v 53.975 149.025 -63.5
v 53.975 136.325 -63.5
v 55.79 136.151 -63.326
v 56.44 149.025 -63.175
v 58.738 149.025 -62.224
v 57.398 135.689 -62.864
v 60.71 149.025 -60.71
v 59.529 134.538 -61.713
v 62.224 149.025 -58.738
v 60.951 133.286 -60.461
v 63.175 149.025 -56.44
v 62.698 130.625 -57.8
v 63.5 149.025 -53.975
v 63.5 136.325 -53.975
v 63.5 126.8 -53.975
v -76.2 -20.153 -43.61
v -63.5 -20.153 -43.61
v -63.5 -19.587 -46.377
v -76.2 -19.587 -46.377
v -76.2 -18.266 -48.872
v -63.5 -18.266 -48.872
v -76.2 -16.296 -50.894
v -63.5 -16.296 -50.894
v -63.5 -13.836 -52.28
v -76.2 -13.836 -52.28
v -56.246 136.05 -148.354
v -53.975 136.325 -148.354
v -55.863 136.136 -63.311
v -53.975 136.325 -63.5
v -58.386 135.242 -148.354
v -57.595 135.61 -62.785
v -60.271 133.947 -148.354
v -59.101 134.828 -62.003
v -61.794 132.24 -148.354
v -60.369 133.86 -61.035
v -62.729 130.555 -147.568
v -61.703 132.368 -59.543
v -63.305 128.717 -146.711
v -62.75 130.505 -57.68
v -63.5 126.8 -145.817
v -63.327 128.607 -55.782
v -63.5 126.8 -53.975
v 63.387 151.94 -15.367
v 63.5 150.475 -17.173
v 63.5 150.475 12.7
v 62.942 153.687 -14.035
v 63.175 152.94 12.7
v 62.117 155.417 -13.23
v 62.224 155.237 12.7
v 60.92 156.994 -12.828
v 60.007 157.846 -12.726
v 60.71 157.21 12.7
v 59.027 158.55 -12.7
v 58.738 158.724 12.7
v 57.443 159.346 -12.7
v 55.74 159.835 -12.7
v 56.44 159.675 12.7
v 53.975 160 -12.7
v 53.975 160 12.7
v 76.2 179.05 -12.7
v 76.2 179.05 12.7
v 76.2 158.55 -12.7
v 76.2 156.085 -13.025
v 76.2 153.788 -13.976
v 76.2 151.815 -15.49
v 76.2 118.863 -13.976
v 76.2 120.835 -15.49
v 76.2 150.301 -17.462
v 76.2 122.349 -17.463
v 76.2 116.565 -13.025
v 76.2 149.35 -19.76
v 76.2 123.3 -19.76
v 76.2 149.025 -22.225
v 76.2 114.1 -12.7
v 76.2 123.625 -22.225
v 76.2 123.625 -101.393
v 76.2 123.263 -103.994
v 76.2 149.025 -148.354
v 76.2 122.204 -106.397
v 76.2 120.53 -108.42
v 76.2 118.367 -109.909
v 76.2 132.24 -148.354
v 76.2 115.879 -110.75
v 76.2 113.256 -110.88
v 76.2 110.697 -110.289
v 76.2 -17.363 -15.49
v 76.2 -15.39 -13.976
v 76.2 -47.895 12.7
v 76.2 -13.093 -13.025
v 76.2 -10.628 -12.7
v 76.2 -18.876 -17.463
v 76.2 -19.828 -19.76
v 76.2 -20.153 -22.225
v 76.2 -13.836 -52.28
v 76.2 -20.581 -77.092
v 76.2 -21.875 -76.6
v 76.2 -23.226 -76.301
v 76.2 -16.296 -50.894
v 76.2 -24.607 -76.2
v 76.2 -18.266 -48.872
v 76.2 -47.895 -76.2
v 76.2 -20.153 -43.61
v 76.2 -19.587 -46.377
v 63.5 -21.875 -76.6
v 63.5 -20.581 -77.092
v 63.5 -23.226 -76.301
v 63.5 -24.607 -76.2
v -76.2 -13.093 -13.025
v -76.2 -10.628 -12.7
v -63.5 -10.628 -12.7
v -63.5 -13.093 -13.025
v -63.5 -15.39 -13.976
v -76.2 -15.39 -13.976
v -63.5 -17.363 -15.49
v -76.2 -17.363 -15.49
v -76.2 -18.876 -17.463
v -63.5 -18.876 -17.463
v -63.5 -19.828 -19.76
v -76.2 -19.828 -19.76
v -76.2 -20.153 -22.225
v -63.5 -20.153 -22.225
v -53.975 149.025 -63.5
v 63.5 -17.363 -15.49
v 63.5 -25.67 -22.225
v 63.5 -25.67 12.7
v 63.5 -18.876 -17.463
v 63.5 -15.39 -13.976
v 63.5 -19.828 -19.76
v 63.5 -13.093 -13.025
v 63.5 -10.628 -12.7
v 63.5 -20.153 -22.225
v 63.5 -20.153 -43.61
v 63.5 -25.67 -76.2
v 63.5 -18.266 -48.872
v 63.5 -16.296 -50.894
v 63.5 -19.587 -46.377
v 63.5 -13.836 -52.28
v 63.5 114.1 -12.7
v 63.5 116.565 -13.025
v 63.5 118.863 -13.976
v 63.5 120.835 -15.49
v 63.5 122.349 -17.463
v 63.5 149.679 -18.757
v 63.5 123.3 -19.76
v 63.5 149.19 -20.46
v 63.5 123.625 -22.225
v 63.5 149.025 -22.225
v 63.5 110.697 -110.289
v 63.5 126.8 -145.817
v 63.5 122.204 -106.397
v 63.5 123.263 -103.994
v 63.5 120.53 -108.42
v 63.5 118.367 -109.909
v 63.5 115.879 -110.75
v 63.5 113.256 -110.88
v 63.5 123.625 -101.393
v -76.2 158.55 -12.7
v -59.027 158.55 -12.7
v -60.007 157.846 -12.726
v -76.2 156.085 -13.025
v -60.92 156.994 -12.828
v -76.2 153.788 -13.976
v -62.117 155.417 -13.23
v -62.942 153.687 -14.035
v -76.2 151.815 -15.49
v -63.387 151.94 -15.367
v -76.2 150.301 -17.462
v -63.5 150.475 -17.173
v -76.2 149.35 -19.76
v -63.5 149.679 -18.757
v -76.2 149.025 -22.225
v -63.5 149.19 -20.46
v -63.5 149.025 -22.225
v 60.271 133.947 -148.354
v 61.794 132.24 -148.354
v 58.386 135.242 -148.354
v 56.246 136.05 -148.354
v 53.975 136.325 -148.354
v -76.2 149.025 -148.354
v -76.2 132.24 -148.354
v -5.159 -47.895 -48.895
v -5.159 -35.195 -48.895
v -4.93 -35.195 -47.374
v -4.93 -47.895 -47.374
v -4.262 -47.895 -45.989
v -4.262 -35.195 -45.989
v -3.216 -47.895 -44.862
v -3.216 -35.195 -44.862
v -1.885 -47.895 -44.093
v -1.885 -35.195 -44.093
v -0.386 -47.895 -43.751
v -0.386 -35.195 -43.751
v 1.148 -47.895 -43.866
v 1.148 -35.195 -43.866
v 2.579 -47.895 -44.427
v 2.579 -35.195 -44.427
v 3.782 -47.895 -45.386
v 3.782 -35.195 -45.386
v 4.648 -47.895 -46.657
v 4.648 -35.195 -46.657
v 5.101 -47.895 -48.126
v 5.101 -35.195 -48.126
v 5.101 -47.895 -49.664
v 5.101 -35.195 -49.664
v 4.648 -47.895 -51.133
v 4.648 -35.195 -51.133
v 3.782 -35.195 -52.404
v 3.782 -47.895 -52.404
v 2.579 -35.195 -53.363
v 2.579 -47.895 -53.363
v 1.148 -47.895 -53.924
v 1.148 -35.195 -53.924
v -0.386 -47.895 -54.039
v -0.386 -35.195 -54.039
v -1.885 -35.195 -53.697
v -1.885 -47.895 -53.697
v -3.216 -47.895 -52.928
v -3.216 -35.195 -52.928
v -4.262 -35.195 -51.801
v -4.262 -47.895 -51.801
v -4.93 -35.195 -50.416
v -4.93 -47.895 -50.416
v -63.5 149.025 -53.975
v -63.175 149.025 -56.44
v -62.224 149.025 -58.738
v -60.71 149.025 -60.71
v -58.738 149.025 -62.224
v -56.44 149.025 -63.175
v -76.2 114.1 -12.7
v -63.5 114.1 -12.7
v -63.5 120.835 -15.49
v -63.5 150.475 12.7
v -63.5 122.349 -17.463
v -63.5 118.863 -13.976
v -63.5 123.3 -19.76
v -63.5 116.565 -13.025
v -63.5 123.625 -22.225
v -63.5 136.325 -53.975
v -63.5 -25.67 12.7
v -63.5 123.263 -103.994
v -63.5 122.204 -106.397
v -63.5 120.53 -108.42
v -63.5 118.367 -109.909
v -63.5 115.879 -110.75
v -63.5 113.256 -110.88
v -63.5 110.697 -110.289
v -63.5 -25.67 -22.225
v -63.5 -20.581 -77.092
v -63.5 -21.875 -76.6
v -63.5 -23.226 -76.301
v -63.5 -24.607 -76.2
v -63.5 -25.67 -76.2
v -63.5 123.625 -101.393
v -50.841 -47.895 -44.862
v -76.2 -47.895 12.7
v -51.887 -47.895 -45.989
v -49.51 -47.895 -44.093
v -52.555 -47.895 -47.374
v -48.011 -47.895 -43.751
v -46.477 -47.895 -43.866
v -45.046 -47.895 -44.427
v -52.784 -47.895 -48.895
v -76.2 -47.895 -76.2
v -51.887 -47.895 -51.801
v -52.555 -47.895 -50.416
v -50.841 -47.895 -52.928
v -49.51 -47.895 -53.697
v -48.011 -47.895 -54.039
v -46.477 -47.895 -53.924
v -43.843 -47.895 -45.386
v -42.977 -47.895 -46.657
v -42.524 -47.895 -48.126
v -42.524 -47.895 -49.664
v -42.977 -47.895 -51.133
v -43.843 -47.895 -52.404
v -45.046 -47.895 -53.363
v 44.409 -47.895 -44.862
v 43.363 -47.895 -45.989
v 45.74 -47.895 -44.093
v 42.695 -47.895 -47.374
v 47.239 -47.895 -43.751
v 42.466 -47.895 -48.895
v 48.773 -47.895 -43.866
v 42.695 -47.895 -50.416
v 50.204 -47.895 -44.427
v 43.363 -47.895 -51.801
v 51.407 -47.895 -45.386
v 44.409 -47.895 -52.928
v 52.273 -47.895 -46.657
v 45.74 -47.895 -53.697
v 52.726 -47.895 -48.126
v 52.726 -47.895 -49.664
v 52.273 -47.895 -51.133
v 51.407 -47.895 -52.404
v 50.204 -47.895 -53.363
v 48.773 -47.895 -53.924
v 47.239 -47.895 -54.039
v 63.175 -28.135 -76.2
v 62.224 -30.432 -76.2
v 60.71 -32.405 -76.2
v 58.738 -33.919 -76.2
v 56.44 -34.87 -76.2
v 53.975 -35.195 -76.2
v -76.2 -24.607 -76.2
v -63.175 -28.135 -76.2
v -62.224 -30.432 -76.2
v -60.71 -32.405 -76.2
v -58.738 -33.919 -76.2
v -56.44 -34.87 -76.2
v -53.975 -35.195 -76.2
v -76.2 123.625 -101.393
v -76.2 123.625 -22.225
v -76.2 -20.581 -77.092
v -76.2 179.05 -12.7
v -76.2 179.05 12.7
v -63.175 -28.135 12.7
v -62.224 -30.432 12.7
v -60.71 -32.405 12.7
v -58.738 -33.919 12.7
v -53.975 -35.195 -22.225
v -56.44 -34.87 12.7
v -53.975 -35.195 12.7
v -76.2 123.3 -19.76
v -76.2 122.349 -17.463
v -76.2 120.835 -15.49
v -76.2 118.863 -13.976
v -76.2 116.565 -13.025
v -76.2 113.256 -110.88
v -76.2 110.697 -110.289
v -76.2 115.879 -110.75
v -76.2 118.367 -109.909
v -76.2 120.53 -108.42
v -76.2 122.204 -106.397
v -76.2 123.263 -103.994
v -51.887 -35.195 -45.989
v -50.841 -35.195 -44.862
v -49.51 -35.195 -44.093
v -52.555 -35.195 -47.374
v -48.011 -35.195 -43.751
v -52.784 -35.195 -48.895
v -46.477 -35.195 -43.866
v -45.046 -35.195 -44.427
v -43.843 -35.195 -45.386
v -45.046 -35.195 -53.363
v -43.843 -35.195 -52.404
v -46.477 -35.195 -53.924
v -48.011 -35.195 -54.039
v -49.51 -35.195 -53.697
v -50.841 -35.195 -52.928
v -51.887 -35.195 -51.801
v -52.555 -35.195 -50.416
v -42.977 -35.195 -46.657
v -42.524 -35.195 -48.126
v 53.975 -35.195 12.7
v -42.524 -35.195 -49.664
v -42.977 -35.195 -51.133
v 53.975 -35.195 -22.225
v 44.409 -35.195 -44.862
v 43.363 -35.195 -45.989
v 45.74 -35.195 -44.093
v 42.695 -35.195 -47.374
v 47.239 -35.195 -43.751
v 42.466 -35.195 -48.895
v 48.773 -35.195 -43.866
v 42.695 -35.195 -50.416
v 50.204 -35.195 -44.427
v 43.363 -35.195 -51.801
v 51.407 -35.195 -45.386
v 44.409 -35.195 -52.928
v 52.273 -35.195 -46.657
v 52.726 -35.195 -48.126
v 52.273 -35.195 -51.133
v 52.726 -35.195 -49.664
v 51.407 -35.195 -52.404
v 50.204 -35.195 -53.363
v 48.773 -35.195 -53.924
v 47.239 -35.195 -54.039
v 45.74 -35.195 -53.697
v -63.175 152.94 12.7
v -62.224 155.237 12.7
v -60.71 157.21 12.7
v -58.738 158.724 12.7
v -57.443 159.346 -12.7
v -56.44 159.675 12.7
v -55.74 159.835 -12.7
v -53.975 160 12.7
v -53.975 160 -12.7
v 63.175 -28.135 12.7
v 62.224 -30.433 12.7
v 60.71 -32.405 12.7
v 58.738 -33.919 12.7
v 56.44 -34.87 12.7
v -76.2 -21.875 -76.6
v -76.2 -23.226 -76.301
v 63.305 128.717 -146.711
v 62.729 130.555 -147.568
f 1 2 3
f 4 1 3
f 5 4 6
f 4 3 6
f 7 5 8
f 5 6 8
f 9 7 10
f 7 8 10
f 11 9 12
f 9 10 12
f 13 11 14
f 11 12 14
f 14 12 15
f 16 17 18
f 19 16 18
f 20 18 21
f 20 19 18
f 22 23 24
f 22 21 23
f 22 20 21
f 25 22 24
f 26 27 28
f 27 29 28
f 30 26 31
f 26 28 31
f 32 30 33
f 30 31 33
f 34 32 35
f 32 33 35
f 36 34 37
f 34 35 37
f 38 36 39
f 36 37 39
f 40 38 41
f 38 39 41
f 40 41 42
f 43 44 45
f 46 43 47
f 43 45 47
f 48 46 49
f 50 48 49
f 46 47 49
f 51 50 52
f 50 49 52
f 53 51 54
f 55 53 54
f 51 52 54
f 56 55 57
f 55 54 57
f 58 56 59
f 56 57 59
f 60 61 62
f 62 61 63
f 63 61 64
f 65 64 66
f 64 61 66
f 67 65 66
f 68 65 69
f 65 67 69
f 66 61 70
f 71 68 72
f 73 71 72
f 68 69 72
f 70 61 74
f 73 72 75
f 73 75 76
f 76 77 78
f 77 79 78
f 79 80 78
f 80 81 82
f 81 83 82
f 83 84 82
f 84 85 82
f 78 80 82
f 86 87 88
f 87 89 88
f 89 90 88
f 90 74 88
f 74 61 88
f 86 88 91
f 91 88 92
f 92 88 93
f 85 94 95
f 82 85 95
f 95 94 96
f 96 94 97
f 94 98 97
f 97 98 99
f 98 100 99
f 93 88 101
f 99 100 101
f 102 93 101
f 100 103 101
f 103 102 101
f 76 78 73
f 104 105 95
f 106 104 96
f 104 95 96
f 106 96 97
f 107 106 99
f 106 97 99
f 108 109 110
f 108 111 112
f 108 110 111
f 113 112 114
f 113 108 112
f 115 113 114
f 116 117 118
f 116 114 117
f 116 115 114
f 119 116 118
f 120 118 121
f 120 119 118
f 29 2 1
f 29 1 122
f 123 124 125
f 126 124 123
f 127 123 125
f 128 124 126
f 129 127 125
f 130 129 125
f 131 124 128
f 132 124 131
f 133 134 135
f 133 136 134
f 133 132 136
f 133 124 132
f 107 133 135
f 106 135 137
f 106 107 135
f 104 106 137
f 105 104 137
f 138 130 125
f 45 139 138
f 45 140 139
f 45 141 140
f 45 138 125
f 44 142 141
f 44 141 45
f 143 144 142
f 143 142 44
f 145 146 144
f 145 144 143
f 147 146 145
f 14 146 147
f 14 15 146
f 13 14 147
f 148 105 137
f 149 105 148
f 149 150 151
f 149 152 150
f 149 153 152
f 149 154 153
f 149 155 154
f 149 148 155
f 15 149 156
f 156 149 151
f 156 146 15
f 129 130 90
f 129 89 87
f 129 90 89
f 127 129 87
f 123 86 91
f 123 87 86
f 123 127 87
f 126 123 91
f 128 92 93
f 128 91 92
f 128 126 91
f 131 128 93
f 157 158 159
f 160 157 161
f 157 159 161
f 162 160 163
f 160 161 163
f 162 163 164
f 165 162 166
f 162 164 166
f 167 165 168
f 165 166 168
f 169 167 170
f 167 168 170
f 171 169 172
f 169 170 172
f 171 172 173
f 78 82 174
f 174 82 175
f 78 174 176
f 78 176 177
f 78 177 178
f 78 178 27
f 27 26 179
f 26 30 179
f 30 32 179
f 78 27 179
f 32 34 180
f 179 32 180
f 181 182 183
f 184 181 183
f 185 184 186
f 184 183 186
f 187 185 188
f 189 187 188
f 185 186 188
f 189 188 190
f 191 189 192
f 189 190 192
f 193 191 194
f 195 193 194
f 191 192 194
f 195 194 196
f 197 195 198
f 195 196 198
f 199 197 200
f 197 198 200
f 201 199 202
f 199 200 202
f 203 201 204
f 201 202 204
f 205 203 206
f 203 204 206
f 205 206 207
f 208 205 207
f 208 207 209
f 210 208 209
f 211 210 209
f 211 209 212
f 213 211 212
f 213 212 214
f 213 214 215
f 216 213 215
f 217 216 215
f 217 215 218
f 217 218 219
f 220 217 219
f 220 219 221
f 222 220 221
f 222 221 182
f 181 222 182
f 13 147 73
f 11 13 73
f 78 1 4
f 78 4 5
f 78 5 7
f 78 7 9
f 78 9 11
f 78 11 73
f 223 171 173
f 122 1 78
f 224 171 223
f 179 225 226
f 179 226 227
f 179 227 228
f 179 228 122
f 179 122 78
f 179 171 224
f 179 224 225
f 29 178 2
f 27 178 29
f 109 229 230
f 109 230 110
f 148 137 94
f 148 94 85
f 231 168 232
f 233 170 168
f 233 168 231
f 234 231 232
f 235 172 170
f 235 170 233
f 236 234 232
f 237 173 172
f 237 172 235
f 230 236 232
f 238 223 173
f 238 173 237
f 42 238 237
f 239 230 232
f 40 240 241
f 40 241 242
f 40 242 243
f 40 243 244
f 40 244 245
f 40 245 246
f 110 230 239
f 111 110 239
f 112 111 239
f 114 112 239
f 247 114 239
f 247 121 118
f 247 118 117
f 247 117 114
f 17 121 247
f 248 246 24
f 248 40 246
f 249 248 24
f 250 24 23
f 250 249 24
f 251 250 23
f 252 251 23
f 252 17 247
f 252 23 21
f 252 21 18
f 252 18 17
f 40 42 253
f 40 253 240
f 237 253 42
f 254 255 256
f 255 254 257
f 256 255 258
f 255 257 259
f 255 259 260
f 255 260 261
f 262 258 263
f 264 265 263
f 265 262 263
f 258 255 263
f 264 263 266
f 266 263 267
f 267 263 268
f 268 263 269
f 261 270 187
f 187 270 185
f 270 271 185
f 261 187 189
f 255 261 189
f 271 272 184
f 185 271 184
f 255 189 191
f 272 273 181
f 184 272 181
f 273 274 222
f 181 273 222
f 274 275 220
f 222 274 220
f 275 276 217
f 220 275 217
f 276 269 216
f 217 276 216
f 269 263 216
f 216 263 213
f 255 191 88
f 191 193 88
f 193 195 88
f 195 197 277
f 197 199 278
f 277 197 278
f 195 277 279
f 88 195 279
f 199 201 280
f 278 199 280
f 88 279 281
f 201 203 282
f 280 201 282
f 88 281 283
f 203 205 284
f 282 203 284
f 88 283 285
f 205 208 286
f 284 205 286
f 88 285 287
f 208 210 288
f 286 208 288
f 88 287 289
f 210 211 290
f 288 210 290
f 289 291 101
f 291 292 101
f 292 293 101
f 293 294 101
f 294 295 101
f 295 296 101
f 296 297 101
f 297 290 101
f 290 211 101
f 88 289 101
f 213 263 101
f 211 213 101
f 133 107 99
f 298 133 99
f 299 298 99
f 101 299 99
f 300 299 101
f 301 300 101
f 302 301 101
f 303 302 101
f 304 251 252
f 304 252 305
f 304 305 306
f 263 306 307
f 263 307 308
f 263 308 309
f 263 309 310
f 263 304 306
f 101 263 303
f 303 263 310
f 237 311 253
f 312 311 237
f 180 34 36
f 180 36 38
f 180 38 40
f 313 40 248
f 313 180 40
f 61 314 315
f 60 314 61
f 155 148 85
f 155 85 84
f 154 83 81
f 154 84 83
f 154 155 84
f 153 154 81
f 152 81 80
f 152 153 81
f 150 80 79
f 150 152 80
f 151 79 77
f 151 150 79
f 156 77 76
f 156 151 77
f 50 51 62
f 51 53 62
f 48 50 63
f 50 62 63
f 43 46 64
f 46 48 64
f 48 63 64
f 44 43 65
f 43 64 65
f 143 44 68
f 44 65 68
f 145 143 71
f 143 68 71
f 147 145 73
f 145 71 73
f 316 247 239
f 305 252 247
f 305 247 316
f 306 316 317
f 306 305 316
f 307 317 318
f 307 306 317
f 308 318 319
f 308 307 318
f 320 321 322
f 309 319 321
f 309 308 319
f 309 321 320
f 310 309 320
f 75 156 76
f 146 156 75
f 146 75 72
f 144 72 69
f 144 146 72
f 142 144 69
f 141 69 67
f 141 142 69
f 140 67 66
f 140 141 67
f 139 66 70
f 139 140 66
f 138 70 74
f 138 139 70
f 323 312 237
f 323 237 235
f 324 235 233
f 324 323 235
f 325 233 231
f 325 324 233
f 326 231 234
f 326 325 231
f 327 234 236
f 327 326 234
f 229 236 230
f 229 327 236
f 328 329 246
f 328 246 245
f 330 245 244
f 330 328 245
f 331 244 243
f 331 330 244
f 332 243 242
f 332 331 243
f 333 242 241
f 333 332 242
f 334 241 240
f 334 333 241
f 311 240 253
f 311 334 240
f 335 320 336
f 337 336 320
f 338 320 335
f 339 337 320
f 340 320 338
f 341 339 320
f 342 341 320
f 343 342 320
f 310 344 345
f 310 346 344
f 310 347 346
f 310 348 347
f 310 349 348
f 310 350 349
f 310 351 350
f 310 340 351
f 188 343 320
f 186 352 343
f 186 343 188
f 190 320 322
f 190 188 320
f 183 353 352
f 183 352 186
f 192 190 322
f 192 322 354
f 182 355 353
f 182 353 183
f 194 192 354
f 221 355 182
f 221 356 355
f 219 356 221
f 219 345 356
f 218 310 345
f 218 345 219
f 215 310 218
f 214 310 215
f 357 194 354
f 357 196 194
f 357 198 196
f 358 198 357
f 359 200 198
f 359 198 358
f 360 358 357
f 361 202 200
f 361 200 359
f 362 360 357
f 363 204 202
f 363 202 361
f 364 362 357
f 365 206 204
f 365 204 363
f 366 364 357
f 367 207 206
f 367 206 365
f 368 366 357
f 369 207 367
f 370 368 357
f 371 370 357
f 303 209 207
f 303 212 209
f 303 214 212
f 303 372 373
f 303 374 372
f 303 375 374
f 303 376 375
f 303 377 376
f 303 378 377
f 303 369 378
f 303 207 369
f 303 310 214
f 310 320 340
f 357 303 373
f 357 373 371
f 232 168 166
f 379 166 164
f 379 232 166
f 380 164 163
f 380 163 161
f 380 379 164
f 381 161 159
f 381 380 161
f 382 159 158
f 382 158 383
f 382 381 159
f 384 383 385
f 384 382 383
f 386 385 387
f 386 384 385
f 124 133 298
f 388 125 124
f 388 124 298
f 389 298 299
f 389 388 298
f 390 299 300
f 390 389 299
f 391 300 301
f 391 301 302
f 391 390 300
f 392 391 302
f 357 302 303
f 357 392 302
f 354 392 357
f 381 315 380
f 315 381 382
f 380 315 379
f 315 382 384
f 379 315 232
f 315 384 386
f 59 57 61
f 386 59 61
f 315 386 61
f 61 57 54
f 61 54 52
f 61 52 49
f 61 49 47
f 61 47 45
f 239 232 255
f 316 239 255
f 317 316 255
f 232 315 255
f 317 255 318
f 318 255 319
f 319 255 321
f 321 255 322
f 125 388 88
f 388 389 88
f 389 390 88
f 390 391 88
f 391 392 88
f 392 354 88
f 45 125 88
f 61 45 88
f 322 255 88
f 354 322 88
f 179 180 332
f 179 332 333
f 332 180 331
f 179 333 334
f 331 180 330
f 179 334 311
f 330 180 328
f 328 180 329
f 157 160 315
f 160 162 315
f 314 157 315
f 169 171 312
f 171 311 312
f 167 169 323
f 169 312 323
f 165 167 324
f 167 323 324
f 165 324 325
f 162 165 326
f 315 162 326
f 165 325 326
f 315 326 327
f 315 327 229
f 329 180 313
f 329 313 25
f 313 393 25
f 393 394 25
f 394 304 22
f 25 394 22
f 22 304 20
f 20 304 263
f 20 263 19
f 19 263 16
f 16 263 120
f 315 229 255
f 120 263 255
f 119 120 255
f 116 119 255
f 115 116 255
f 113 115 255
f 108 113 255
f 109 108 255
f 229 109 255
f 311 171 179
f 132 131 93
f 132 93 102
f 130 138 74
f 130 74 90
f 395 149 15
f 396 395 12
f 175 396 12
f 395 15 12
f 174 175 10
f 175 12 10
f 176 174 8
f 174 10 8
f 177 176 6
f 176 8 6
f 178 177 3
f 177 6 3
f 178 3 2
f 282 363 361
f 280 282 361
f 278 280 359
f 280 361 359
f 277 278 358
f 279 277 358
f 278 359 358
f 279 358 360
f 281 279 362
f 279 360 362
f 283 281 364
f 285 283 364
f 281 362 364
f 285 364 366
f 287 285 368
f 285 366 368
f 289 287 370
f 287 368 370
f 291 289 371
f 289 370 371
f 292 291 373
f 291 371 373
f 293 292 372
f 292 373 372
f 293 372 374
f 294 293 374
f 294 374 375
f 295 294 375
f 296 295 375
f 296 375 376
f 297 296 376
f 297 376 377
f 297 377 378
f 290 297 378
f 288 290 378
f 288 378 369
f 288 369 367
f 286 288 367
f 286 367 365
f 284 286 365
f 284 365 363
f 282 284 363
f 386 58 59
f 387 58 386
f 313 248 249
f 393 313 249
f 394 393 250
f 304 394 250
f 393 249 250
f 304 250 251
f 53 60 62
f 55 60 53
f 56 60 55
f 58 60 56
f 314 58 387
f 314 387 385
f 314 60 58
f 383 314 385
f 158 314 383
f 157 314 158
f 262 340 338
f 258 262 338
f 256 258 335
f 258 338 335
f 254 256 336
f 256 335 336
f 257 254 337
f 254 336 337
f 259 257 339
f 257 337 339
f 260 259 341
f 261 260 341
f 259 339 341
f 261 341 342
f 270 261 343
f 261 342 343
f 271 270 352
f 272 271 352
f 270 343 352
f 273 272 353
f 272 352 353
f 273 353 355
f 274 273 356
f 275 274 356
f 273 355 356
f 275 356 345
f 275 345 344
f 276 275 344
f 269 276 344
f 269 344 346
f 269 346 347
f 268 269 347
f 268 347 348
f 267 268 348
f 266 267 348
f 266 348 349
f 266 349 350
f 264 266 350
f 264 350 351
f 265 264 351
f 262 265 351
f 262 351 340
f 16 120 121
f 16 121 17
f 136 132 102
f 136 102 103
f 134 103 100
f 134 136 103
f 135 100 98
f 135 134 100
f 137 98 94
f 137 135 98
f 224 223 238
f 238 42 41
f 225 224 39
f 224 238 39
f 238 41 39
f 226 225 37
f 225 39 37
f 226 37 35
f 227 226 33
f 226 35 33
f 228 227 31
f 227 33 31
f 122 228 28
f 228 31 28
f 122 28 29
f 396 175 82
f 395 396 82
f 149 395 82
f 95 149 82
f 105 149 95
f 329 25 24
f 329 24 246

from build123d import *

# Parameters (mm, degrees)
BOSS_EXTRUDE1_DEPTH             = 179.04999999999998
BOSS_EXTRUDE1_DEPTH_BACK        = 139.19200000000004
BOSS_EXTRUDE2_REACH             = 246.692
BOSS_EXTRUDE2_DIRECTION_2_REACH = 246.692
F_3_8_CLEARANCE_HOLE1_D         = 10.31748
CUT_EXTRUDE1_DEPTH              = 245.69215738419686
CUT_EXTRUDE1_DEPTH_BACK         = 245.69215738419686
FILLET1_R                       = 9.525
CUT_EXTRUDE2_DEPTH              = 101.6
CUT_EXTRUDE2_DEPTH_BACK         = 184.22
FILLET2_START                   = -36
FILLET2_DEPTH                   = 185.025000106
FILLET2_START_2                 = -63.5
FILLET2_2_DEPTH                 = 9.525
FILLET2_START_3                 = 53.975
FILLET2_3_DEPTH                 = 9.525
FILLET2_START_4                 = 149.025000106
FILLET2_4_DEPTH                 = 9.525
FILLET2_5_DEPTH                 = 185.025000106
CUT_EXTRUDE3_DEPTH              = 245.69215738419686
CUT_EXTRUDE3_DEPTH_BACK         = 245.69215738419686
FILLET3_R                       = 9.525
CUT_EXTRUDE4_REACH              = 254.594
CUT_EXTRUDE5_DEPTH              = 245.6921573841969
CUT_EXTRUDE5_DEPTH_BACK         = 25.4
FILLET5_R                       = 9.525
CUT_EXTRUDE6_DEPTH              = 245.6921574759669
CUT_EXTRUDE6_DEPTH_BACK         = 245.6921574759669


with BuildPart() as part:
    # Sketch1 → Boss-Extrude1 (new, two sides: drawn at the far end of the back side and taken through both)
    with BuildSketch(Plane(origin=(0, 0, 0), x_dir=(1, 0, 0), z_dir=(0, 1, 0)).offset(-BOSS_EXTRUDE1_DEPTH_BACK)):
        Polygon((-76.20000000000003, 148.35400023367268), (-76.2000000000001, -12.7), (76.2, -12.7), (76.19999999999997, 148.35400023367268), align=None)
    extrude(amount=BOSS_EXTRUDE1_DEPTH + BOSS_EXTRUDE1_DEPTH_BACK)

    # SurfaceCut1
    split(bisect_by=Plane(origin=(-4.831e-14, -47.89499999999913, 0), x_dir=(1, -6e-17, 0), z_dir=(6e-17, 1, -1.73e-15)), keep=Keep.TOP)

    # Boss-Extrude2: up to this face of the body (flat: up to its plane)
    boss_extrude2_end = Plane(part.part.faces().sort_by_distance((76.2, 65.5775, -67.827000117))[0])
    # Sketch3 → Boss-Extrude2 (add, up to the picked face)
    with BuildSketch(Plane(origin=(0, 0, 0), x_dir=(0, 0, -1), z_dir=(1, 0, 0)), mode=Mode.PRIVATE) as boss_extrude2_sk1:
        Polygon((1.2e-16, -38.36999999999911), (75, -38.36999999999911), (75, -47.89499999999911), (1.29e-15, -47.89499999999911), align=None)
    boss_extrude2_tool1 = split(extrude(boss_extrude2_sk1.sketch, amount=BOSS_EXTRUDE2_REACH, mode=Mode.PRIVATE), bisect_by=boss_extrude2_end, keep=Keep.BOTH, mode=Mode.PRIVATE)
    add(boss_extrude2_tool1.solids().sort_by(Axis((0, -43.1325, -37.5), (1, 0, 0)))[0])

    # Boss-Extrude2 direction 2: up to this face of the body (flat: up to its plane)
    boss_extrude2_direction_2_end = Plane(part.part.faces().sort_by_distance((-76.2, 65.5775, -67.827000117))[0])
    # Sketch3 → Boss-Extrude2 direction 2 (add, up to the picked face)
    with BuildSketch(Plane(origin=(0, 0, 0), x_dir=(0, 0, -1), z_dir=(1, 0, 0)), mode=Mode.PRIVATE) as boss_extrude2_direction_2_sk1:
        Polygon((1.2e-16, -38.36999999999911), (75, -38.36999999999911), (75, -47.89499999999911), (1.29e-15, -47.89499999999911), align=None)
    boss_extrude2_direction_2_tool1 = split(extrude(boss_extrude2_direction_2_sk1.sketch, amount=-BOSS_EXTRUDE2_DIRECTION_2_REACH, mode=Mode.PRIVATE), bisect_by=boss_extrude2_direction_2_end, keep=Keep.BOTH, mode=Mode.PRIVATE)
    add(boss_extrude2_direction_2_tool1.solids().sort_by(Axis((0, -43.1325, -37.5), (-1, 0, 0)))[0])

    # 3/8 Clearance Hole1 (through all)
    with Locations(Plane.XZ.offset(47.89499999999913)):
        with Locations((47.625, -48.895), (-47.625, -48.895), (0, -48.895)):
            Hole(F_3_8_CLEARANCE_HOLE1_D / 2)

    # Sketch8 → Cut-Extrude1 (cut, two sides: drawn at the far end of the back side and taken through both)
    with BuildSketch(Plane(origin=(0, 0, 0), x_dir=(0, 0, -1), z_dir=(1, 0, 0)).offset(-CUT_EXTRUDE1_DEPTH_BACK)):
        Polygon((266.69999999999993, 301.4250001060008), (12.699999999999932, 301.42500010600077), (12.699999999999935, 149.02500010600082), (266.69999999999993, 149.02500010600085), align=None)
    extrude(amount=CUT_EXTRUDE1_DEPTH + CUT_EXTRUDE1_DEPTH_BACK, mode=Mode.SUBTRACT)

    # Fillet1
    fillet1_edges = [part.edges().sort_by_distance(p)[0] for p in [
        (-2.842e-14, 149.02500010600082, -12.699999999999935),
    ]]
    fillet(fillet1_edges, radius=FILLET1_R)

    # Sketch10 → Cut-Extrude2 (cut, two sides: drawn at the far end of the back side and taken through both)
    with BuildSketch(Plane(origin=(0, 149.02500010600082, 1.628e-14), x_dir=(1, 0, 0), z_dir=(0, 1, 1.1e-16)).offset(-CUT_EXTRUDE2_DEPTH_BACK)):
        Polygon((63.500000000000014, 63.49999999999994), (-63.500000000000014, 63.49999999999993), (-63.5, 12.699999999999932), (63.5, 12.699999999999948), align=None)
    extrude(amount=CUT_EXTRUDE2_DEPTH + CUT_EXTRUDE2_DEPTH_BACK, mode=Mode.SUBTRACT)

    # Fillet2: read off the stored shape, not the designer's step
    # Fillet2 outline → Fillet2 (add)
    with BuildSketch(Plane(origin=(0, 0, 0), x_dir=(1, 0, 0), z_dir=(0, 1, 0)).offset(FILLET2_START)):
        with BuildLine():
            Line((-63.5, 12.7), (-53.975, 12.7))
            ThreePointArc((-53.975, 12.7), (-60.710192091, 15.489807909), (-63.5, 22.225))
            Line((-63.5, 22.225), (-63.5, 12.7))
        make_face()
        with BuildLine():
            ThreePointArc((63.5, 22.225), (60.710192091, 15.489807909), (53.975, 12.7))
            Line((53.975, 12.7), (63.5, 12.7))
            Line((63.5, 12.7), (63.5, 22.225))
        make_face()
    extrude(amount=FILLET2_DEPTH)

    # Fillet2 2 outline → Fillet2 2 (add)
    with BuildSketch(Plane.YZ.offset(FILLET2_START_2)):
        with BuildLine():
            Line((149.025000106, -12.7), (149.025000106, -22.225))
            ThreePointArc((149.025000106, -22.225), (151.814808015, -15.489807909), (158.550000106, -12.7))
            Line((158.550000106, -12.7), (149.025000106, -12.7))
        make_face()
    extrude(amount=FILLET2_2_DEPTH)

    # Fillet2 3 outline → Fillet2 3 (add)
    with BuildSketch(Plane.YZ.offset(FILLET2_START_3)):
        with BuildLine():
            Line((149.025000106, -12.7), (149.025000106, -22.225))
            ThreePointArc((149.025000106, -22.225), (151.814808015, -15.489807909), (158.550000106, -12.7))
            Line((158.550000106, -12.7), (149.025000106, -12.7))
        make_face()
    extrude(amount=FILLET2_3_DEPTH)

    # Fillet2 4 outline → Fillet2 4 (cut)
    with BuildSketch(Plane(origin=(0, 0, 0), x_dir=(1, 0, 0), z_dir=(0, 1, 0)).offset(FILLET2_START_4)):
        with BuildLine():
            Line((-53.975, 22.225), (-63.5, 22.225))
            ThreePointArc((-63.5, 22.225), (-60.710192091, 15.489807909), (-53.975, 12.7))
            Line((-53.975, 12.7), (-53.975, 22.225))
        make_face()
        with BuildLine():
            ThreePointArc((53.975, 12.7), (60.710192091, 15.489807909), (63.5, 22.225))
            Line((63.5, 22.225), (53.975, 22.225))
            Line((53.975, 22.225), (53.975, 12.7))
        make_face()
    extrude(amount=FILLET2_4_DEPTH, mode=Mode.SUBTRACT)

    # Fillet2 5 outline → Fillet2 5 (add)
    with BuildSketch(Plane(origin=(0, 0, 0), x_dir=(1, 0, 0), z_dir=(0, 1, 0)).offset(FILLET2_START)):
        with BuildLine():
            ThreePointArc((53.975, 63.5), (60.710192091, 60.710192091), (63.5, 53.975))
            Line((63.5, 53.975), (63.5, 22.225))
            Line((63.5, 22.225), (76.2, 22.225))
            Line((76.2, 22.225), (76.2, 148.354000234))
            Line((76.2, 148.354000234), (-76.2, 148.354000234))
            Line((-76.2, 148.354000234), (-76.2, 22.225))
            Line((-76.2, 22.225), (-63.5, 22.225))
            Line((-63.5, 22.225), (-63.5, 53.975))
            ThreePointArc((-63.5, 53.975), (-60.710192091, 60.710192091), (-53.975, 63.5))
            Line((-53.975, 63.5), (53.975, 63.5))
        make_face()
    extrude(amount=FILLET2_5_DEPTH)

    # Sketch11 → Cut-Extrude3 (cut, two sides: drawn at the far end of the back side and taken through both)
    with BuildSketch(Plane(origin=(0, 0, 0), x_dir=(0, 0, -1), z_dir=(1, 0, 0)).offset(-CUT_EXTRUDE3_DEPTH_BACK)):
        Polygon((279.3999999999999, 413.26880624754574), (76.19999999999999, -22.494999999999397), (76.19999999999999, -78.83303235544759), (279.3999999999999, -78.83303235544756), align=None)
    extrude(amount=CUT_EXTRUDE3_DEPTH + CUT_EXTRUDE3_DEPTH_BACK, mode=Mode.SUBTRACT)

    # Fillet3
    fillet3_edges = [part.edges().sort_by_distance(p)[0] for p in [
        (-5.684e-14, -22.494999999999397, -76.19999999999999),
    ]]
    fillet(fillet3_edges, radius=FILLET3_R)

    # Cut-Extrude4: up to this face of the body (flat: up to its plane)
    cut_extrude4_end = Plane(part.part.faces().sort_by_distance((0, 75.599563928, -12.7))[0])
    # Sketch14 → Cut-Extrude4 (cut, up to the picked face)
    with BuildSketch(Plane(origin=(0, 0, -148.35400023367268), x_dir=(-1, 0, 0), z_dir=(0, 0, -1)), mode=Mode.PRIVATE) as cut_extrude4_sk1:
        Polygon((-63.5, 136.32500010600086), (63.5, 136.32500010600089), (63.50000000000004, -35.19499999999937), (-63.499999999999986, -35.19499999999938), align=None)
    cut_extrude4_tool1 = split(extrude(cut_extrude4_sk1.sketch, amount=-CUT_EXTRUDE4_REACH, mode=Mode.PRIVATE), bisect_by=cut_extrude4_end, keep=Keep.BOTH, mode=Mode.PRIVATE)
    add(cut_extrude4_tool1.solids().sort_by(Axis((0, 50.565, -148.354), (0, 0, 1)))[0], mode=Mode.SUBTRACT)

    # Sketch15 → Cut-Extrude5 (cut, two sides: drawn at the far end of the back side and taken through both)
    with BuildSketch(Plane.XY.offset(-CUT_EXTRUDE5_DEPTH_BACK)):
        Polygon((63.5, 159.99999999999997), (-63.5, 159.99999999999994), (-63.500000000000014, -35.194999999999425), (63.50000000000007, -35.19499999999941), align=None)
    extrude(amount=CUT_EXTRUDE5_DEPTH + CUT_EXTRUDE5_DEPTH_BACK, mode=Mode.SUBTRACT)

    # Fillet5
    fillet5_edges = [part.edges().sort_by_distance(p)[0] for p in [
        (63.5, 159.99999999999997, 2.842e-14),
        (-63.5, 159.99999999999994, 2.842e-14),
        (-63.5, 136.32500010600089, -101.16450011683634),
        (63.5, 136.32500010600086, -101.16450011683634),
        (63.5, -35.19499989399918, -38.1),
        (-63.5, -35.19499989399918, -38.1),
    ]]
    fillet(fillet5_edges, radius=FILLET5_R)

    # Sketch16 → Cut-Extrude6 (cut, two sides: drawn at the far end of the back side and taken through both)
    with BuildSketch(Plane(origin=(0, 0, 0), x_dir=(0, 0, -1), z_dir=(1, 0, 0)).offset(-CUT_EXTRUDE6_DEPTH_BACK)):
        with BuildLine():
            Line((22.225, -20.152543088136632), (43.61046140315716, -20.152543088136635))
            ThreePointArc((43.61046140315716, -20.152543088136635), (48.871667611787636, -18.266432044059904), (52.27951237608929, -13.836499798218902))
            Line((52.27951237608929, -13.836499798218902), (110.28947349119366, 110.6974636611936))
            ThreePointArc((110.28947349119366, 110.6974636611936), (109.2394256542931, 119.49983646292918), (101.39293648279772, 123.62500010600078))
            Line((101.39293648279772, 123.62500010600078), (22.225000000000072, 123.6250001060008))
            ThreePointArc((22.225000000000072, 123.6250001060008), (15.489807909198145, 120.83519219680267), (12.700000000000001, 114.10000010600075))
            Line((12.700000000000001, 114.10000010600075), (12.7, -10.627543088136633))
            ThreePointArc((12.7, -10.627543088136633), (15.489807909198138, -17.362735178938497), (22.225, -20.152543088136632))
        make_face()
    extrude(amount=CUT_EXTRUDE6_DEPTH + CUT_EXTRUDE6_DEPTH_BACK, mode=Mode.SUBTRACT)


solid = part.part
